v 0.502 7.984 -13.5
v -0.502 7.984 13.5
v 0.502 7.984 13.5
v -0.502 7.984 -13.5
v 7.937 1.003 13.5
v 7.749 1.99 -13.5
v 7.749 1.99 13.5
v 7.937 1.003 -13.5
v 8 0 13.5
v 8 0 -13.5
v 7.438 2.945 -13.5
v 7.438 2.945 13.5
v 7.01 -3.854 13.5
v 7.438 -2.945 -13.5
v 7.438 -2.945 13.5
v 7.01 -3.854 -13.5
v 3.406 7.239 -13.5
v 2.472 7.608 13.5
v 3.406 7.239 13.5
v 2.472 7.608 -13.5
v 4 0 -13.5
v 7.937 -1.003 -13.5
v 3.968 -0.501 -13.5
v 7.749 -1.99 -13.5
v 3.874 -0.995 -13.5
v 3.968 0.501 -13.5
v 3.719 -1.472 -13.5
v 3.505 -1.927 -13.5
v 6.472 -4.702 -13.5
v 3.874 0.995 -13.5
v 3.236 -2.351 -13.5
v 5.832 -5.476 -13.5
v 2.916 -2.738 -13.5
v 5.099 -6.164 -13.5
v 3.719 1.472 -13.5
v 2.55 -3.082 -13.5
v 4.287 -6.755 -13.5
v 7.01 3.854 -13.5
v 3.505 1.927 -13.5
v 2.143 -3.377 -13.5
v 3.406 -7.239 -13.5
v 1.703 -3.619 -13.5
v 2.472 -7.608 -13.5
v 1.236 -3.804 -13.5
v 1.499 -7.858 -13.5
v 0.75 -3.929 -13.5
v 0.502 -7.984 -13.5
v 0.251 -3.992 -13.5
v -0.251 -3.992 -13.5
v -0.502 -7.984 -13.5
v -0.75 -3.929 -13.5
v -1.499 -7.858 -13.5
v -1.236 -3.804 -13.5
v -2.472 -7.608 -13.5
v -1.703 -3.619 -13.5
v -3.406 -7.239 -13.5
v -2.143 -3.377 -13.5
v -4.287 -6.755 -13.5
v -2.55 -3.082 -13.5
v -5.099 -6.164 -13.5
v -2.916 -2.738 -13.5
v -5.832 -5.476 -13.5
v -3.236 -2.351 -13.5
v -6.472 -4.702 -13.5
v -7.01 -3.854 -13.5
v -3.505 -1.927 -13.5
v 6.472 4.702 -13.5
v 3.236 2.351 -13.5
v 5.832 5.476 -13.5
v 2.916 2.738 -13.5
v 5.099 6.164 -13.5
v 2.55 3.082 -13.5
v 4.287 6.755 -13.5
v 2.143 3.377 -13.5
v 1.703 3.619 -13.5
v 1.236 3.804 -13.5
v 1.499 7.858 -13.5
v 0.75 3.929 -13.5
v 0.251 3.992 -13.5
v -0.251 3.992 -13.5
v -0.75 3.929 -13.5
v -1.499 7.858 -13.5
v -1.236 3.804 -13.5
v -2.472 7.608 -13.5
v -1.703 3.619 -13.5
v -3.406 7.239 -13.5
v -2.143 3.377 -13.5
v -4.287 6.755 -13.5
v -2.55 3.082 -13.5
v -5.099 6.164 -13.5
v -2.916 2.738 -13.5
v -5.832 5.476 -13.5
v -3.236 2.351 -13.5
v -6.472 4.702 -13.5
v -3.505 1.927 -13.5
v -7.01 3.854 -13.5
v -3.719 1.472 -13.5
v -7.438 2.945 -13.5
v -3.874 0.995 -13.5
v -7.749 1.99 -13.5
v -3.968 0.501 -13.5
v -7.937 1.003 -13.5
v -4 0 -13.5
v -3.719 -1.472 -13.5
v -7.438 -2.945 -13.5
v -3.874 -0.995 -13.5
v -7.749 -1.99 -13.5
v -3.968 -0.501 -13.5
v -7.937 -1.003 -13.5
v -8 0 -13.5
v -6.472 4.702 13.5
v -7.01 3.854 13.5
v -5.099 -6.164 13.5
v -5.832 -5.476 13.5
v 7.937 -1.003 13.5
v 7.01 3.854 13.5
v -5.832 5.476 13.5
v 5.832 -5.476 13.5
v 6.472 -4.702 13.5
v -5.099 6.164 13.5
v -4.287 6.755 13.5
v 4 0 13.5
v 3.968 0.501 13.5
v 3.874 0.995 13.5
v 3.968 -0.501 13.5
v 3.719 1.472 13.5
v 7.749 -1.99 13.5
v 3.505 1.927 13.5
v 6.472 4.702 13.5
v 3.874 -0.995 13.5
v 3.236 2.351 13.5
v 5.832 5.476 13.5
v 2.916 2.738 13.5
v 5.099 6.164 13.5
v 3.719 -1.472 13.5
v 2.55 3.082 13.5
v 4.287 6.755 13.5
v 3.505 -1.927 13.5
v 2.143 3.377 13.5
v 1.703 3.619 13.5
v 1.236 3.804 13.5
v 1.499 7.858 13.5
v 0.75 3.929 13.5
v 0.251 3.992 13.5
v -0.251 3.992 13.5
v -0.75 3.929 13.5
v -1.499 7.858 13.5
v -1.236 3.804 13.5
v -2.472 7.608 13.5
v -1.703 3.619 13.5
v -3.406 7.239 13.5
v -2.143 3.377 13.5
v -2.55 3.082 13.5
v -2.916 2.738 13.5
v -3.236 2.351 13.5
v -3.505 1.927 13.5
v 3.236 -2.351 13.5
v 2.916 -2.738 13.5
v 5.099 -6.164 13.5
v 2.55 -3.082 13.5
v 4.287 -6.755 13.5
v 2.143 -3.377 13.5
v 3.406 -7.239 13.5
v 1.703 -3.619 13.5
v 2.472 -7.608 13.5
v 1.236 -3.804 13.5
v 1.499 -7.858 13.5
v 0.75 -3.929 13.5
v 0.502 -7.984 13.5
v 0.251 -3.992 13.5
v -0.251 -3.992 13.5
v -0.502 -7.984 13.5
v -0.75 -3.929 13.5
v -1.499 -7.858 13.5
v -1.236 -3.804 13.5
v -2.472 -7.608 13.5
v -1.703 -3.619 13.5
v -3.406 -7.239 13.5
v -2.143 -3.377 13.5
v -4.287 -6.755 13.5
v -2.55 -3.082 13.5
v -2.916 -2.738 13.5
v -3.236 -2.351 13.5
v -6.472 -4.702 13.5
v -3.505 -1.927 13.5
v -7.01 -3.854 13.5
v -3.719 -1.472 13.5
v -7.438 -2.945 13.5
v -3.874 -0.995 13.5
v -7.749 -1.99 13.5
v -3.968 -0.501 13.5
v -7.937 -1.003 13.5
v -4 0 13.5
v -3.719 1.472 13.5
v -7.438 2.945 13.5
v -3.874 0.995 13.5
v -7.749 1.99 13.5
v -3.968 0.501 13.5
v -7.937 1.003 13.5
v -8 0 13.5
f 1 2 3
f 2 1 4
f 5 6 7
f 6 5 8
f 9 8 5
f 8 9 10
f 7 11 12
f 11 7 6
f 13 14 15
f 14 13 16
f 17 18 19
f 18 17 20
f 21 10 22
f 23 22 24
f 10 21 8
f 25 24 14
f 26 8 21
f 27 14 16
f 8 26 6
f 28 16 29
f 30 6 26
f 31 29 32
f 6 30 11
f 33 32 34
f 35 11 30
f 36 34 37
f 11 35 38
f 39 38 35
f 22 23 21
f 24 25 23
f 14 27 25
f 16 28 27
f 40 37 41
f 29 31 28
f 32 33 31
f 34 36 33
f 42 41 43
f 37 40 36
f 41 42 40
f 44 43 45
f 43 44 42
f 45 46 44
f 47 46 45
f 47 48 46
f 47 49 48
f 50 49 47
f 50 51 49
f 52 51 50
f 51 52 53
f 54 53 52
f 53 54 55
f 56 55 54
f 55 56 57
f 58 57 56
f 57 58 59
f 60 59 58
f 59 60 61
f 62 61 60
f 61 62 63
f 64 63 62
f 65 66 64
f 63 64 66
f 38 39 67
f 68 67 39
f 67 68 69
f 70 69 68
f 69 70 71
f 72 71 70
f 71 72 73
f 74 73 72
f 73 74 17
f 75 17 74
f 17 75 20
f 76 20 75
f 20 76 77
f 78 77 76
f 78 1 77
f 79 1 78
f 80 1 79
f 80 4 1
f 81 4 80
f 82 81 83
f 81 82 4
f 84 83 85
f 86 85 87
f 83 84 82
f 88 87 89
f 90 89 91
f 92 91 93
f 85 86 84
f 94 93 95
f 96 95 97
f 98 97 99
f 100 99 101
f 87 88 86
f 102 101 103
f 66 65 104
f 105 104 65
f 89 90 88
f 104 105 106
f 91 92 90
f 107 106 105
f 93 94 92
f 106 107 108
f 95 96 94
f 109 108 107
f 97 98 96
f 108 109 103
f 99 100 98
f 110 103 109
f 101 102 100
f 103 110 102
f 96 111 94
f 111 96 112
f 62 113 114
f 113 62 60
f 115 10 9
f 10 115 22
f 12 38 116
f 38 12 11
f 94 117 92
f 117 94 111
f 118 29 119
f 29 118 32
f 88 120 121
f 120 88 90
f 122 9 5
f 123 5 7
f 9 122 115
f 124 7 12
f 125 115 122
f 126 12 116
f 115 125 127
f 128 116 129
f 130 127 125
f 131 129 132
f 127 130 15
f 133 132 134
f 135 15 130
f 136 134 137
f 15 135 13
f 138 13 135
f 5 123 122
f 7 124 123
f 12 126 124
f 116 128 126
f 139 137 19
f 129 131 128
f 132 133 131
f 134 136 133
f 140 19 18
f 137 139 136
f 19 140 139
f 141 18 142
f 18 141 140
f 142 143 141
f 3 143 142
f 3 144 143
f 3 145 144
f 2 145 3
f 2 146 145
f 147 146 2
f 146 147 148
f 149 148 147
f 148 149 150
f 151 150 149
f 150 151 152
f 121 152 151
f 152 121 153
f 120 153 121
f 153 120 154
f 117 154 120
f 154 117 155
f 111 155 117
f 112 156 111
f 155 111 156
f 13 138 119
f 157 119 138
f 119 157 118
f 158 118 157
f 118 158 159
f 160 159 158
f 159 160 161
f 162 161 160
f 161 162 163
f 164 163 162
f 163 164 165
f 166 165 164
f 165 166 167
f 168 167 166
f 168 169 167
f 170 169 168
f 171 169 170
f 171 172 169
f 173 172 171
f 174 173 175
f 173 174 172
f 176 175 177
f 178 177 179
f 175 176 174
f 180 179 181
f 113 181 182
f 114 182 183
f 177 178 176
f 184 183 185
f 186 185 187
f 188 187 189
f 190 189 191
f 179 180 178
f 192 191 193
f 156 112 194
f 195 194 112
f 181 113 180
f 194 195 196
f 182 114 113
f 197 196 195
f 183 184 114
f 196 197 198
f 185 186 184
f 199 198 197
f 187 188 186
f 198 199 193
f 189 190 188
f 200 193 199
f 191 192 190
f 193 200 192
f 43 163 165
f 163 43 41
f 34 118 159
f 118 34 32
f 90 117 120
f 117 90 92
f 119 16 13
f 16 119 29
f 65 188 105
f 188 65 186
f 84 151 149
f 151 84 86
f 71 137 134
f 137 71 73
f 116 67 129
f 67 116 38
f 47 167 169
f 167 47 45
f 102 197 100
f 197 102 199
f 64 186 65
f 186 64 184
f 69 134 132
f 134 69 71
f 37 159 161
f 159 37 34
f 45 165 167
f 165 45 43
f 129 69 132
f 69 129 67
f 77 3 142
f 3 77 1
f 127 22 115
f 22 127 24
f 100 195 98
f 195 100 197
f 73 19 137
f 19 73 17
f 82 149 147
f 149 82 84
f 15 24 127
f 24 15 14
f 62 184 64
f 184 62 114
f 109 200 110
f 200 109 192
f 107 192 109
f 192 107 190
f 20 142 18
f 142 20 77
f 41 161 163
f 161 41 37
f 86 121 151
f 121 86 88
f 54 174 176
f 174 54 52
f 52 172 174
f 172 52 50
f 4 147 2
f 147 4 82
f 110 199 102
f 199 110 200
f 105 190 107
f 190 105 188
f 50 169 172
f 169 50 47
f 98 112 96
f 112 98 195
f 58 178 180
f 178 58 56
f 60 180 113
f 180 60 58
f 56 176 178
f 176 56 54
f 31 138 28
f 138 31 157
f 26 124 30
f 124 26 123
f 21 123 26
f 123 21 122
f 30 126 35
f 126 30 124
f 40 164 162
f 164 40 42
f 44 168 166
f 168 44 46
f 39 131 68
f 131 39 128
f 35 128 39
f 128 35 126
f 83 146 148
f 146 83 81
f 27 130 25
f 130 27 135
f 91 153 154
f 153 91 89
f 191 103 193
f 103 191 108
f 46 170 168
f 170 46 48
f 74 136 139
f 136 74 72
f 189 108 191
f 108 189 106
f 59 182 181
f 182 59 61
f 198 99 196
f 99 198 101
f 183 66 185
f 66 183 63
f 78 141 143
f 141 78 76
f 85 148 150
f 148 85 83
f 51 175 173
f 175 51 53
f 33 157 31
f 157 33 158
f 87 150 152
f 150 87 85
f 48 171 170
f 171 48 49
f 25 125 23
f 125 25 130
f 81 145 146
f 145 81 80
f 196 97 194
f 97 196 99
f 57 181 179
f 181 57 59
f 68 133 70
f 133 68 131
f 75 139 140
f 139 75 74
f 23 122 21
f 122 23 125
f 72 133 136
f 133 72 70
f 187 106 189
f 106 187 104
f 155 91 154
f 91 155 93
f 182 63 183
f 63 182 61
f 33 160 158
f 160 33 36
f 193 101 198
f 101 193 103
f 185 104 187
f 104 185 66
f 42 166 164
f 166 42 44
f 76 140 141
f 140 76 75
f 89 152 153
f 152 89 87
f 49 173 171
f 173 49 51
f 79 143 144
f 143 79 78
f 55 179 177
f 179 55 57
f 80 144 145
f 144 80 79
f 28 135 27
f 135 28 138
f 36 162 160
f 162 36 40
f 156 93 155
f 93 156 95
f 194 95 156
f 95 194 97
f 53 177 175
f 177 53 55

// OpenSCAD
$fn = 50;


difference() {
	union() {
		translate(v = [0, 0, -13.5000000000]) {
			cylinder(h = 27, r = 8.0000000000);
		}
	}
	union() {
		translate(v = [0, 0, -100.0000000000]) {
			cylinder(h = 200, r = 4.0000000000);
		}
	}
}
